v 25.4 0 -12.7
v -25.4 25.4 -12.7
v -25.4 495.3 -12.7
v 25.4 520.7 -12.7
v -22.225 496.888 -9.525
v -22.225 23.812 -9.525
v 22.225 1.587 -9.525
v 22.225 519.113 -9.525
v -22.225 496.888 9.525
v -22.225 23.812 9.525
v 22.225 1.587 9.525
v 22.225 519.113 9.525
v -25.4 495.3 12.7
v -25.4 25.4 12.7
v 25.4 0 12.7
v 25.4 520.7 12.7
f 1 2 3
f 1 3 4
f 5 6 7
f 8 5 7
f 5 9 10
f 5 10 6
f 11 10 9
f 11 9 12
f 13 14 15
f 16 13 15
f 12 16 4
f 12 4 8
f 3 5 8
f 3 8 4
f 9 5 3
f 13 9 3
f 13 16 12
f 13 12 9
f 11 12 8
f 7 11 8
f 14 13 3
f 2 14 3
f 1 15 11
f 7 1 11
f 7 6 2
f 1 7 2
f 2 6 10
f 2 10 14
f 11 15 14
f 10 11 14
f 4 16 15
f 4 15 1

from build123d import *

# Parameters (mm, degrees)
SKETCH1_W           = 50.8
SKETCH1_H           = 25.4
SKETCH1_W_2         = 44.45
SKETCH1_H_2         = 19.05
EXTRUDE_THIN1_DEPTH = 520.7
CUT_EXTRUDE1_DEPTH  = 522.937553736


with BuildPart() as part:
    # Sketch1 → Extrude-Thin1 (new body)
    with BuildSketch(Plane(origin=(0, 0, 0), x_dir=(1, 0, 0), z_dir=(0, 1, 0))):
        Rectangle(SKETCH1_W, SKETCH1_H)
        Rectangle(SKETCH1_W_2, SKETCH1_H_2, mode=Mode.SUBTRACT)
    extrude(amount=EXTRUDE_THIN1_DEPTH)

    # Sketch2 → Cut-Extrude1 (cut, through all)
    with BuildSketch(Plane.XY.offset(12.7)):
        Polygon((25.4, 0), (-25.4, 25.4), (-25.4, 0), align=None)
        Polygon((-25.4, 520.7), (25.4, 520.7), (-25.4, 495.3), align=None)
    extrude(amount=-CUT_EXTRUDE1_DEPTH, mode=Mode.SUBTRACT)


solid = part.part
